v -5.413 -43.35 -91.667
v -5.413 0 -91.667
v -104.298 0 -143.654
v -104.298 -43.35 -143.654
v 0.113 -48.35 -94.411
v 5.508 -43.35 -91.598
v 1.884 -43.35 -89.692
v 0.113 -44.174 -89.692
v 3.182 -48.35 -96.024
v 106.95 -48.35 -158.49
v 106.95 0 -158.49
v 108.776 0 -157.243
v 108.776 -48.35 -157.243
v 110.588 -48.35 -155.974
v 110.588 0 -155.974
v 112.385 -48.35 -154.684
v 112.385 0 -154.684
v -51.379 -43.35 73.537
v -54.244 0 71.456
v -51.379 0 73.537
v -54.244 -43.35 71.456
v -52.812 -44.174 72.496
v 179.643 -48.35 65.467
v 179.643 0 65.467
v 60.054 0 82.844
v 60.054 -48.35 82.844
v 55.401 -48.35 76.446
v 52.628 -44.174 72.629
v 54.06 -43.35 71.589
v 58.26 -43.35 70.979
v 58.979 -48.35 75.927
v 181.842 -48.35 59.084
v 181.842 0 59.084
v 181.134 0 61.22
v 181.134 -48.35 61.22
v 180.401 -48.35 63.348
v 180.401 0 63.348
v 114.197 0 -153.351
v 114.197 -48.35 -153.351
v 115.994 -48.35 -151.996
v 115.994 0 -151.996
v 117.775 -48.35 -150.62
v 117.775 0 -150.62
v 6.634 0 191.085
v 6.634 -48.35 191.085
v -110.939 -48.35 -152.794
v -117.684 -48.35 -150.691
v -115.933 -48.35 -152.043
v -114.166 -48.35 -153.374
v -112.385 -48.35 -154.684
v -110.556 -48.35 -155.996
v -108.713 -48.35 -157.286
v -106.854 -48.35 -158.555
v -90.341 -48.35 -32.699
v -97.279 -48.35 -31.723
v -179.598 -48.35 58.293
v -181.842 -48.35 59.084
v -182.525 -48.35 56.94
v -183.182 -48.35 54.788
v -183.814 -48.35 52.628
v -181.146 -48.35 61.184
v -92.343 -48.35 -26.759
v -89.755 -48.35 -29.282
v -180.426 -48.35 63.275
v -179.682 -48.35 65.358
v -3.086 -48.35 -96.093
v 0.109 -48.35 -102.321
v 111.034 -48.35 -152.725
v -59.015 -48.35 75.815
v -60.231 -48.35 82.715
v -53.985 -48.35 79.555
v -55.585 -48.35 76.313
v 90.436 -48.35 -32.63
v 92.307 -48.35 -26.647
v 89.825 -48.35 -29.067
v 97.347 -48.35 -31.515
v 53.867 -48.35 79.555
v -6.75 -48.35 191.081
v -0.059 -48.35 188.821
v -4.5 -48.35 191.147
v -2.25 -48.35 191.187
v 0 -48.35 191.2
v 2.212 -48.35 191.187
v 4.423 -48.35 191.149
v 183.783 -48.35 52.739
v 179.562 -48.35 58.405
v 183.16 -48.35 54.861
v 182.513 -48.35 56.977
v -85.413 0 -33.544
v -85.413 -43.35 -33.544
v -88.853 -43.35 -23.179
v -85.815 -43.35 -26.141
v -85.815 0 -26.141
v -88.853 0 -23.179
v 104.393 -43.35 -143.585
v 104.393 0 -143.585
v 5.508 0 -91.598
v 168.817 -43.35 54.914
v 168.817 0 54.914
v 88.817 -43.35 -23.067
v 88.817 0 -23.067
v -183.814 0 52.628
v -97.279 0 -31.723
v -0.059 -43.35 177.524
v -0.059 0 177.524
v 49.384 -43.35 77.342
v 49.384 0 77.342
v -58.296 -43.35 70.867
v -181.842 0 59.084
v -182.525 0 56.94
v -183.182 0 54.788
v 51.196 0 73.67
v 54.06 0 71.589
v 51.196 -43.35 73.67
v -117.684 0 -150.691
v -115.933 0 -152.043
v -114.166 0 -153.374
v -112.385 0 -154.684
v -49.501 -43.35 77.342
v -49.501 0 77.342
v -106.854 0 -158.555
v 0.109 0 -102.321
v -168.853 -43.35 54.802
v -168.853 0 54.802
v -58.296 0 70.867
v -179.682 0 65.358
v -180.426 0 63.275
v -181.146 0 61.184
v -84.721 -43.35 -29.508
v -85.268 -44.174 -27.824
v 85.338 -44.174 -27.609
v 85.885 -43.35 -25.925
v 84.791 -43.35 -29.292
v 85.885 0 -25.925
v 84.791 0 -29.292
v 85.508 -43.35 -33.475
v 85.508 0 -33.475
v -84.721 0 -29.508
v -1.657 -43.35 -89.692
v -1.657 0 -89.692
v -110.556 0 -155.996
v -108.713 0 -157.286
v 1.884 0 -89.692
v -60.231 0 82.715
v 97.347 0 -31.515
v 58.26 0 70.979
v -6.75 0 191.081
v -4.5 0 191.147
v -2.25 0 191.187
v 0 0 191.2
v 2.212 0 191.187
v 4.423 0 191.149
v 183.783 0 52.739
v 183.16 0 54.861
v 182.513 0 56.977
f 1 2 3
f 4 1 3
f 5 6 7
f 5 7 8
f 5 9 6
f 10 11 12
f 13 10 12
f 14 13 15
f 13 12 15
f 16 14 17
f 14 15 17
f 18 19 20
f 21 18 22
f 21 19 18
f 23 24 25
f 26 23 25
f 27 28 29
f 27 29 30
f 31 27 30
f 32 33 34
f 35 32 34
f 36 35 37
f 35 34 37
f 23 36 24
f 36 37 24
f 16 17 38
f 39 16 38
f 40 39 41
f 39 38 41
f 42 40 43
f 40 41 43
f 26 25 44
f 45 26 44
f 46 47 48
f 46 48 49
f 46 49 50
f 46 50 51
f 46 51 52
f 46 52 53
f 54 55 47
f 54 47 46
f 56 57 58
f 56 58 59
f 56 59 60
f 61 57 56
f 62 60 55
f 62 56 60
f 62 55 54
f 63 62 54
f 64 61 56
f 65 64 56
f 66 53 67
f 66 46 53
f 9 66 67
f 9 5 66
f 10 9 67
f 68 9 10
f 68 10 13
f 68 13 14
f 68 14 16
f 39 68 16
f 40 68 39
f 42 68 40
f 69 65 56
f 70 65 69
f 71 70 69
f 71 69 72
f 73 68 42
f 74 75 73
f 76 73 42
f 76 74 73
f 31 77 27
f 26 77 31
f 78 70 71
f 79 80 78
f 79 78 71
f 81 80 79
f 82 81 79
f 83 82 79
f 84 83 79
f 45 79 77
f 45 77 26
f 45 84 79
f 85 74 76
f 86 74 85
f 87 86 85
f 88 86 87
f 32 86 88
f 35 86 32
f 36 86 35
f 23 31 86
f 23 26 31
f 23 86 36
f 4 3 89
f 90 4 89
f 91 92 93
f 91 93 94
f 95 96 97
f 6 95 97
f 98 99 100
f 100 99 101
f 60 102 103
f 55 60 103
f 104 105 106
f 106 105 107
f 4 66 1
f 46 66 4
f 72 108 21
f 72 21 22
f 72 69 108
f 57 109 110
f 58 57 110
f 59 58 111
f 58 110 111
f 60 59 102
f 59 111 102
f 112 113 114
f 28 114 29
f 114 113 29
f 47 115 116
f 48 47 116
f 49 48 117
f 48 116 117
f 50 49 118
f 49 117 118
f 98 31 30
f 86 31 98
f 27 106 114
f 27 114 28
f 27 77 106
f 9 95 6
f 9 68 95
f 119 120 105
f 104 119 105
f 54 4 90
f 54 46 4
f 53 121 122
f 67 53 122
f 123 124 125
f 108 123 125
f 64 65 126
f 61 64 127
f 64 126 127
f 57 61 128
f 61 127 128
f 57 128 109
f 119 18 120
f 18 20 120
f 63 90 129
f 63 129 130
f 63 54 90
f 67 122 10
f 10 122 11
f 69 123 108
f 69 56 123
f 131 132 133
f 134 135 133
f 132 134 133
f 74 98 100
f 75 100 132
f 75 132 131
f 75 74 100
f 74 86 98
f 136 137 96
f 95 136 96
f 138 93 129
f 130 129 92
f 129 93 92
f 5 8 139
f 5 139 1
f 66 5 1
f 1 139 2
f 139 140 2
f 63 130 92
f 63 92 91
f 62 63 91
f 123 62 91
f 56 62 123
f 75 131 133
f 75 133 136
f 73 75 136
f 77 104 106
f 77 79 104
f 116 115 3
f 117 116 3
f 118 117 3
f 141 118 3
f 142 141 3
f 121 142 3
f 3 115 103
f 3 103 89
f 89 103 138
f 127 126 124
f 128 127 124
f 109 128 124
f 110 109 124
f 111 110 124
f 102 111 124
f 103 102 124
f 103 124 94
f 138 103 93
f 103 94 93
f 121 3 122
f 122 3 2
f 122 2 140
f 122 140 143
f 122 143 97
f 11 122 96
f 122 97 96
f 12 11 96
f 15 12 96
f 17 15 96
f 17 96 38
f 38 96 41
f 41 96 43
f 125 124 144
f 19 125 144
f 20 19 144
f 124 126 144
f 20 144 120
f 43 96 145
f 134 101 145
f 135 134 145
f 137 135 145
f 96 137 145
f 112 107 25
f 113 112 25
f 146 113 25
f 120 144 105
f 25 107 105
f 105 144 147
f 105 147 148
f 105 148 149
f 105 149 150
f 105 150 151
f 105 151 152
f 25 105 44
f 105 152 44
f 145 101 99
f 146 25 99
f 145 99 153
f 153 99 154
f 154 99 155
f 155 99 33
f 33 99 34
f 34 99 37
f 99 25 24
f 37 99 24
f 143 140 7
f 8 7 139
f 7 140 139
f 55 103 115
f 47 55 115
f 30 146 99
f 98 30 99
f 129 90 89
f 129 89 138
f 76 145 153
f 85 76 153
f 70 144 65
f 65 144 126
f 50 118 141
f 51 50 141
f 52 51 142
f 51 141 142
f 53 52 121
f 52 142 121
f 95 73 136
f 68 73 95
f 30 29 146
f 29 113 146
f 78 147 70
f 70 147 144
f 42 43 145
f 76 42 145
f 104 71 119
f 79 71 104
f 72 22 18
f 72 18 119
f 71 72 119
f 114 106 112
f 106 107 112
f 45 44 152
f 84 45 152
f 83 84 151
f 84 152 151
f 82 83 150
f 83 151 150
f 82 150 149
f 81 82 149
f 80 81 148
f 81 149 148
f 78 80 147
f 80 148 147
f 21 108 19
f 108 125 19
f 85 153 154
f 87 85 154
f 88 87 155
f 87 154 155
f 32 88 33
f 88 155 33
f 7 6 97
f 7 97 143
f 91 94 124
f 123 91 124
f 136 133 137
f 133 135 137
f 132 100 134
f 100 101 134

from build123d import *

# Parameters (mm, degrees)
F1_DEPTH = 48.35
F2_SIZE  = 5
F3_SIZE  = 2


with BuildPart() as f1:
    # F0 (on Front) → F1 (new body)
    with BuildSketch(Plane.XZ):
        Polygon((3.3454659382, 184.4213456143), (0, 191.2), (-3.4042833476, 184.3021685259), (-0.0588174093, 177.5235141402), align=None)
        with BuildLine():
            Line((3.3454659382, 184.4213456143), (6.6341131163, 191.0848726173))
            ThreePointArc((6.6341131163, 191.0848726173), (3.3175559963, 191.1712159877), (0, 191.2))
            Line((0, 191.2), (3.3454659382, 184.4213456143))
        make_face()
        with BuildLine():
            Line((-3.4042833476, 184.3021685259), (0, 191.2))
            ThreePointArc((0, 191.2), (-3.3754006651, 191.1702034062), (-6.7497492858, 191.0808229116))
            Line((-6.7497492858, 191.0808229116), (-3.4042833476, 184.3021685259))
        make_face()
        Polygon((-3.4042833476, 184.3021685259), (-6.7497492858, 191.0808229116), (-60.2314095212, 82.7151430913), (-53.0235747303, 83.7625027933), align=None)
        Polygon((-0.0588174093, 177.5235141402), (-3.4042833476, 184.3021685259), (-53.0235747303, 83.7625027933), (-56.1922701192, 77.3420246622), (-49.5013382427, 77.3420246622), align=None)
        Polygon((52.9688284065, 83.8734309614), (3.3454659382, 184.4213456143), (-0.0588174093, 177.5235141402), (49.383703424, 77.3420246622), (56.1922701192, 77.3420246622), align=None)
        Polygon((60.054246696, 82.8438594182), (6.6341131163, 191.0848726173), (3.3454659382, 184.4213456143), (52.9688284065, 83.8734309614), align=None)
        Polygon((52.0811544326, 71.876391938), (58.2598817772, 70.9785703011), (56.1922701192, 77.3420246622), (49.383703424, 77.3420246622), align=None)
        Polygon((63.2776884086, 76.312453119), (60.054246696, 82.8438594182), (52.9688284065, 83.8734309614), (56.1922701192, 77.3420246622), align=None)
        Polygon((174.2297969358, 60.1901680357), (179.6428745321, 65.4666146204), (60.054246696, 82.8438594182), (63.2776884086, 76.312453119), align=None)
        Polygon((168.8167193396, 54.9137214509), (174.2297969358, 60.1901680357), (63.2776884086, 76.312453119), (56.1922701192, 77.3420246622), (58.2598817772, 70.9785703011), align=None)
        Polygon((96.1366412096, -24.458033873), (176.4289283194, 53.8076027397), (168.8167193396, 54.9137214509), (88.8170401417, -23.0666929402), (90.9210029578, -29.5420246622), align=None)
        Polygon((97.3469751481, -31.5148222116), (183.7825669636, 52.7390564976), (176.4289283194, 53.8076027397), (96.1366412096, -24.458033873), align=None)
        Polygon((176.4289283194, 53.8076027397), (181.8420059156, 59.0840493245), (174.2297969358, 60.1901680357), (168.8167193396, 54.9137214509), align=None)
        with BuildLine():
            Line((174.2297969358, 60.1901680357), (181.8420059156, 59.0840493245))
            ThreePointArc((181.8420059156, 59.0840493245), (180.7706115026, 62.2850384682), (179.6428745321, 65.4666146204))
            Line((179.6428745321, 65.4666146204), (174.2297969358, 60.1901680357))
        make_face()
        with BuildLine():
            Line((176.4289283194, 53.8076027397), (183.7825669636, 52.7390564976))
            ThreePointArc((183.7825669636, 52.7390564976), (182.8398118758, 55.9199713271), (181.8420059156, 59.0840493245))
            Line((181.8420059156, 59.0840493245), (176.4289283194, 53.8076027397))
        make_face()
        Polygon((85.5079253616, -33.4748557433), (90.9210029578, -29.5420246622), (88.8170401417, -23.0666929402), (84.4524727268, -27.3210946961), align=None)
        Polygon((92.1313368964, -36.5988130009), (97.3469751481, -31.5148222116), (96.1366412096, -24.458033873), (90.9210029578, -29.5420246622), align=None)
        Polygon((104.3932878305, -143.5849678348), (111.0842197069, -147.1025988913), (92.1313368964, -36.5988130009), (90.9210029578, -29.5420246622), (85.5079253616, -33.4748557433), align=None)
        Polygon((111.0842197069, -147.1025988913), (117.7751515833, -150.6202299478), (97.3469751481, -31.5148222116), (92.1313368964, -36.5988130009), align=None)
        Polygon((105.6936083619, -151.166418268), (112.3845402383, -154.6840493245), (111.0842197069, -147.1025988913), (104.3932878305, -143.5849678348), align=None)
        with BuildLine():
            ThreePointArc((112.3845402383, -154.6840493245), (115.0977827408, -152.6759326422), (117.7751515833, -150.6202299478))
            Line((117.7751515833, -150.6202299478), (111.0842197069, -147.1025988913))
            Line((111.0842197069, -147.1025988913), (112.3845402383, -154.6840493245))
        make_face()
        with BuildLine():
            ThreePointArc((106.9497598069, -158.4903431672), (109.6836622396, -156.6107730576), (112.3845402383, -154.6840493245))
            Line((112.3845402383, -154.6840493245), (105.6936083619, -151.166418268))
            Line((105.6936083619, -151.166418268), (106.9497598069, -158.4903431672))
        make_face()
        Polygon((0.1094926475, -102.3210906944), (106.9497598069, -158.4903431672), (105.6936083619, -151.166418268), (6.4468834252, -98.9893271929), align=None)
        Polygon((6.4468834252, -98.9893271929), (105.6936083619, -151.166418268), (104.3932878305, -143.5849678348), (5.5082461637, -91.5980249074), (0, -95.6), align=None)
        Polygon((-6.3373907777, -98.9317635015), (0.1094926475, -102.3210906944), (6.4468834252, -98.9893271929), (0, -95.6), align=None)
        Polygon((0, -95.6), (5.5082461637, -91.5980249074), (0.1133441465, -88.7617570701), (-5.4130775962, -91.6671689189), align=None)
        Polygon((-104.298119263, -143.6541118464), (-105.5759735432, -151.1045739839), (-6.3373907777, -98.9317635015), (0, -95.6), (-5.4130775962, -91.6671689189), align=None)
        Polygon((-105.5759735432, -151.1045739839), (-106.8538278234, -158.5550361215), (0.1094926475, -102.3210906944), (-6.3373907777, -98.9317635015), align=None)
        Polygon((-111.1066859581, -147.2335871869), (-112.3845402383, -154.6840493245), (-105.5759735432, -151.1045739839), (-104.298119263, -143.6541118464), align=None)
        with BuildLine():
            ThreePointArc((-117.6839803143, -150.6914754635), (-115.0515806012, -152.7107520811), (-112.3845402383, -154.6840493245))
            Line((-112.3845402383, -154.6840493245), (-111.1066859581, -147.2335871869))
            Line((-111.1066859581, -147.2335871869), (-117.6839803143, -150.6914754635))
        make_face()
        with BuildLine():
            ThreePointArc((-112.3845402383, -154.6840493245), (-109.636269739, -156.6439541052), (-106.8538278234, -158.5550361215))
            Line((-106.8538278234, -158.5550361215), (-105.5759735432, -151.1045739839))
            Line((-105.5759735432, -151.1045739839), (-112.3845402383, -154.6840493245))
        make_face()
        Polygon((-92.1522481313, -36.7207348557), (-111.1066859581, -147.2335871869), (-104.298119263, -143.6541118464), (-85.4127567941, -33.5439997549), (-90.9210029578, -29.5420246622), align=None)
        Polygon((-97.2793049704, -31.7230896035), (-117.6839803143, -150.6914754635), (-111.1066859581, -147.2335871869), (-92.1522481313, -36.7207348557), align=None)
        Polygon((-90.9210029578, -29.5420246622), (-85.4127567941, -33.5439997549), (-84.3824221918, -27.5366880744), (-88.8533912998, -23.1785703011), align=None)
        Polygon((-96.048059797, -24.54437941), (-97.2793049704, -31.7230896035), (-92.1522481313, -36.7207348557), (-90.9210029578, -29.5420246622), align=None)
        Polygon((-168.8530704977, 54.80184409), (-176.3337597519, 53.7148363136), (-96.048059797, -24.54437941), (-90.9210029578, -29.5420246622), (-88.8533912998, -23.1785703011), align=None)
        Polygon((-176.3337597519, 53.7148363136), (-183.8144490062, 52.6278285372), (-97.2793049704, -31.7230896035), (-96.048059797, -24.54437941), align=None)
        Polygon((-174.3613166614, 60.1710571009), (-181.8420059156, 59.0840493245), (-176.3337597519, 53.7148363136), (-168.8530704977, 54.80184409), align=None)
        with BuildLine():
            ThreePointArc((-181.8420059156, 59.0840493245), (-182.8567238392, 55.864644873), (-183.8144490062, 52.6278285372))
            Line((-183.8144490062, 52.6278285372), (-176.3337597519, 53.7148363136))
            Line((-176.3337597519, 53.7148363136), (-181.8420059156, 59.0840493245))
        make_face()
        with BuildLine():
            Line((-174.3613166614, 60.1710571009), (-179.6824595725, 65.3578895158))
            ThreePointArc((-179.6824595725, 65.3578895158), (-180.7894495105, 62.230337824), (-181.8420059156, 59.0840493245))
            Line((-181.8420059156, 59.0840493245), (-174.3613166614, 60.1710571009))
        make_face()
        Polygon((-60.2314095212, 82.7151430913), (-179.6824595725, 65.3578895158), (-174.3613166614, 60.1710571009), (-63.4001049101, 76.2946649602), align=None)
        Polygon((-63.4001049101, 76.2946649602), (-174.3613166614, 60.1710571009), (-168.8530704977, 54.80184409), (-58.2962329353, 70.8666929402), (-56.1922701192, 77.3420246622), align=None)
        Polygon((-53.0235747303, 83.7625027933), (-60.2314095212, 82.7151430913), (-63.4001049101, 76.2946649602), (-56.1922701192, 77.3420246622), align=None)
        Polygon((-52.2645491141, 71.7431479025), (-49.5013382427, 77.3420246622), (-56.1922701192, 77.3420246622), (-58.2962329353, 70.8666929402), align=None)
    extrude(amount=F1_DEPTH)

    # F2
    f2_edges = [f1.edges().sort_by_distance(p)[0] for p in [
        (-126.617746, -48.35, 13.632578),
        (-94.340271, -48.35, -85.5954),
        (-52.092388, -48.35, -116.207934),
        (52.253316, -48.35, -116.173362),
        (94.42288, -48.35, -85.453031),
        (126.634596, -48.35, 13.796313),
        (110.448937, -48.35, 63.395057),
        (26.011169, -48.35, 124.699953),
        (-26.161683, -48.35, 124.633331),
        (-110.55881, -48.35, 63.272496),
    ]]
    chamfer(f2_edges, length=F2_SIZE)

    # F3
    f3_edges = [f1.edges().sort_by_distance(p)[0] for p in [
        (-84.382422, -21.675, -27.536688),
        (-52.264549, -21.675, 71.743148),
        (0.113344, -21.675, -88.761757),
        (84.452473, -21.675, -27.321095),
        (52.081154, -21.675, 71.876392),
    ]]
    chamfer(f3_edges, length=F3_SIZE)


solid = f1.part
